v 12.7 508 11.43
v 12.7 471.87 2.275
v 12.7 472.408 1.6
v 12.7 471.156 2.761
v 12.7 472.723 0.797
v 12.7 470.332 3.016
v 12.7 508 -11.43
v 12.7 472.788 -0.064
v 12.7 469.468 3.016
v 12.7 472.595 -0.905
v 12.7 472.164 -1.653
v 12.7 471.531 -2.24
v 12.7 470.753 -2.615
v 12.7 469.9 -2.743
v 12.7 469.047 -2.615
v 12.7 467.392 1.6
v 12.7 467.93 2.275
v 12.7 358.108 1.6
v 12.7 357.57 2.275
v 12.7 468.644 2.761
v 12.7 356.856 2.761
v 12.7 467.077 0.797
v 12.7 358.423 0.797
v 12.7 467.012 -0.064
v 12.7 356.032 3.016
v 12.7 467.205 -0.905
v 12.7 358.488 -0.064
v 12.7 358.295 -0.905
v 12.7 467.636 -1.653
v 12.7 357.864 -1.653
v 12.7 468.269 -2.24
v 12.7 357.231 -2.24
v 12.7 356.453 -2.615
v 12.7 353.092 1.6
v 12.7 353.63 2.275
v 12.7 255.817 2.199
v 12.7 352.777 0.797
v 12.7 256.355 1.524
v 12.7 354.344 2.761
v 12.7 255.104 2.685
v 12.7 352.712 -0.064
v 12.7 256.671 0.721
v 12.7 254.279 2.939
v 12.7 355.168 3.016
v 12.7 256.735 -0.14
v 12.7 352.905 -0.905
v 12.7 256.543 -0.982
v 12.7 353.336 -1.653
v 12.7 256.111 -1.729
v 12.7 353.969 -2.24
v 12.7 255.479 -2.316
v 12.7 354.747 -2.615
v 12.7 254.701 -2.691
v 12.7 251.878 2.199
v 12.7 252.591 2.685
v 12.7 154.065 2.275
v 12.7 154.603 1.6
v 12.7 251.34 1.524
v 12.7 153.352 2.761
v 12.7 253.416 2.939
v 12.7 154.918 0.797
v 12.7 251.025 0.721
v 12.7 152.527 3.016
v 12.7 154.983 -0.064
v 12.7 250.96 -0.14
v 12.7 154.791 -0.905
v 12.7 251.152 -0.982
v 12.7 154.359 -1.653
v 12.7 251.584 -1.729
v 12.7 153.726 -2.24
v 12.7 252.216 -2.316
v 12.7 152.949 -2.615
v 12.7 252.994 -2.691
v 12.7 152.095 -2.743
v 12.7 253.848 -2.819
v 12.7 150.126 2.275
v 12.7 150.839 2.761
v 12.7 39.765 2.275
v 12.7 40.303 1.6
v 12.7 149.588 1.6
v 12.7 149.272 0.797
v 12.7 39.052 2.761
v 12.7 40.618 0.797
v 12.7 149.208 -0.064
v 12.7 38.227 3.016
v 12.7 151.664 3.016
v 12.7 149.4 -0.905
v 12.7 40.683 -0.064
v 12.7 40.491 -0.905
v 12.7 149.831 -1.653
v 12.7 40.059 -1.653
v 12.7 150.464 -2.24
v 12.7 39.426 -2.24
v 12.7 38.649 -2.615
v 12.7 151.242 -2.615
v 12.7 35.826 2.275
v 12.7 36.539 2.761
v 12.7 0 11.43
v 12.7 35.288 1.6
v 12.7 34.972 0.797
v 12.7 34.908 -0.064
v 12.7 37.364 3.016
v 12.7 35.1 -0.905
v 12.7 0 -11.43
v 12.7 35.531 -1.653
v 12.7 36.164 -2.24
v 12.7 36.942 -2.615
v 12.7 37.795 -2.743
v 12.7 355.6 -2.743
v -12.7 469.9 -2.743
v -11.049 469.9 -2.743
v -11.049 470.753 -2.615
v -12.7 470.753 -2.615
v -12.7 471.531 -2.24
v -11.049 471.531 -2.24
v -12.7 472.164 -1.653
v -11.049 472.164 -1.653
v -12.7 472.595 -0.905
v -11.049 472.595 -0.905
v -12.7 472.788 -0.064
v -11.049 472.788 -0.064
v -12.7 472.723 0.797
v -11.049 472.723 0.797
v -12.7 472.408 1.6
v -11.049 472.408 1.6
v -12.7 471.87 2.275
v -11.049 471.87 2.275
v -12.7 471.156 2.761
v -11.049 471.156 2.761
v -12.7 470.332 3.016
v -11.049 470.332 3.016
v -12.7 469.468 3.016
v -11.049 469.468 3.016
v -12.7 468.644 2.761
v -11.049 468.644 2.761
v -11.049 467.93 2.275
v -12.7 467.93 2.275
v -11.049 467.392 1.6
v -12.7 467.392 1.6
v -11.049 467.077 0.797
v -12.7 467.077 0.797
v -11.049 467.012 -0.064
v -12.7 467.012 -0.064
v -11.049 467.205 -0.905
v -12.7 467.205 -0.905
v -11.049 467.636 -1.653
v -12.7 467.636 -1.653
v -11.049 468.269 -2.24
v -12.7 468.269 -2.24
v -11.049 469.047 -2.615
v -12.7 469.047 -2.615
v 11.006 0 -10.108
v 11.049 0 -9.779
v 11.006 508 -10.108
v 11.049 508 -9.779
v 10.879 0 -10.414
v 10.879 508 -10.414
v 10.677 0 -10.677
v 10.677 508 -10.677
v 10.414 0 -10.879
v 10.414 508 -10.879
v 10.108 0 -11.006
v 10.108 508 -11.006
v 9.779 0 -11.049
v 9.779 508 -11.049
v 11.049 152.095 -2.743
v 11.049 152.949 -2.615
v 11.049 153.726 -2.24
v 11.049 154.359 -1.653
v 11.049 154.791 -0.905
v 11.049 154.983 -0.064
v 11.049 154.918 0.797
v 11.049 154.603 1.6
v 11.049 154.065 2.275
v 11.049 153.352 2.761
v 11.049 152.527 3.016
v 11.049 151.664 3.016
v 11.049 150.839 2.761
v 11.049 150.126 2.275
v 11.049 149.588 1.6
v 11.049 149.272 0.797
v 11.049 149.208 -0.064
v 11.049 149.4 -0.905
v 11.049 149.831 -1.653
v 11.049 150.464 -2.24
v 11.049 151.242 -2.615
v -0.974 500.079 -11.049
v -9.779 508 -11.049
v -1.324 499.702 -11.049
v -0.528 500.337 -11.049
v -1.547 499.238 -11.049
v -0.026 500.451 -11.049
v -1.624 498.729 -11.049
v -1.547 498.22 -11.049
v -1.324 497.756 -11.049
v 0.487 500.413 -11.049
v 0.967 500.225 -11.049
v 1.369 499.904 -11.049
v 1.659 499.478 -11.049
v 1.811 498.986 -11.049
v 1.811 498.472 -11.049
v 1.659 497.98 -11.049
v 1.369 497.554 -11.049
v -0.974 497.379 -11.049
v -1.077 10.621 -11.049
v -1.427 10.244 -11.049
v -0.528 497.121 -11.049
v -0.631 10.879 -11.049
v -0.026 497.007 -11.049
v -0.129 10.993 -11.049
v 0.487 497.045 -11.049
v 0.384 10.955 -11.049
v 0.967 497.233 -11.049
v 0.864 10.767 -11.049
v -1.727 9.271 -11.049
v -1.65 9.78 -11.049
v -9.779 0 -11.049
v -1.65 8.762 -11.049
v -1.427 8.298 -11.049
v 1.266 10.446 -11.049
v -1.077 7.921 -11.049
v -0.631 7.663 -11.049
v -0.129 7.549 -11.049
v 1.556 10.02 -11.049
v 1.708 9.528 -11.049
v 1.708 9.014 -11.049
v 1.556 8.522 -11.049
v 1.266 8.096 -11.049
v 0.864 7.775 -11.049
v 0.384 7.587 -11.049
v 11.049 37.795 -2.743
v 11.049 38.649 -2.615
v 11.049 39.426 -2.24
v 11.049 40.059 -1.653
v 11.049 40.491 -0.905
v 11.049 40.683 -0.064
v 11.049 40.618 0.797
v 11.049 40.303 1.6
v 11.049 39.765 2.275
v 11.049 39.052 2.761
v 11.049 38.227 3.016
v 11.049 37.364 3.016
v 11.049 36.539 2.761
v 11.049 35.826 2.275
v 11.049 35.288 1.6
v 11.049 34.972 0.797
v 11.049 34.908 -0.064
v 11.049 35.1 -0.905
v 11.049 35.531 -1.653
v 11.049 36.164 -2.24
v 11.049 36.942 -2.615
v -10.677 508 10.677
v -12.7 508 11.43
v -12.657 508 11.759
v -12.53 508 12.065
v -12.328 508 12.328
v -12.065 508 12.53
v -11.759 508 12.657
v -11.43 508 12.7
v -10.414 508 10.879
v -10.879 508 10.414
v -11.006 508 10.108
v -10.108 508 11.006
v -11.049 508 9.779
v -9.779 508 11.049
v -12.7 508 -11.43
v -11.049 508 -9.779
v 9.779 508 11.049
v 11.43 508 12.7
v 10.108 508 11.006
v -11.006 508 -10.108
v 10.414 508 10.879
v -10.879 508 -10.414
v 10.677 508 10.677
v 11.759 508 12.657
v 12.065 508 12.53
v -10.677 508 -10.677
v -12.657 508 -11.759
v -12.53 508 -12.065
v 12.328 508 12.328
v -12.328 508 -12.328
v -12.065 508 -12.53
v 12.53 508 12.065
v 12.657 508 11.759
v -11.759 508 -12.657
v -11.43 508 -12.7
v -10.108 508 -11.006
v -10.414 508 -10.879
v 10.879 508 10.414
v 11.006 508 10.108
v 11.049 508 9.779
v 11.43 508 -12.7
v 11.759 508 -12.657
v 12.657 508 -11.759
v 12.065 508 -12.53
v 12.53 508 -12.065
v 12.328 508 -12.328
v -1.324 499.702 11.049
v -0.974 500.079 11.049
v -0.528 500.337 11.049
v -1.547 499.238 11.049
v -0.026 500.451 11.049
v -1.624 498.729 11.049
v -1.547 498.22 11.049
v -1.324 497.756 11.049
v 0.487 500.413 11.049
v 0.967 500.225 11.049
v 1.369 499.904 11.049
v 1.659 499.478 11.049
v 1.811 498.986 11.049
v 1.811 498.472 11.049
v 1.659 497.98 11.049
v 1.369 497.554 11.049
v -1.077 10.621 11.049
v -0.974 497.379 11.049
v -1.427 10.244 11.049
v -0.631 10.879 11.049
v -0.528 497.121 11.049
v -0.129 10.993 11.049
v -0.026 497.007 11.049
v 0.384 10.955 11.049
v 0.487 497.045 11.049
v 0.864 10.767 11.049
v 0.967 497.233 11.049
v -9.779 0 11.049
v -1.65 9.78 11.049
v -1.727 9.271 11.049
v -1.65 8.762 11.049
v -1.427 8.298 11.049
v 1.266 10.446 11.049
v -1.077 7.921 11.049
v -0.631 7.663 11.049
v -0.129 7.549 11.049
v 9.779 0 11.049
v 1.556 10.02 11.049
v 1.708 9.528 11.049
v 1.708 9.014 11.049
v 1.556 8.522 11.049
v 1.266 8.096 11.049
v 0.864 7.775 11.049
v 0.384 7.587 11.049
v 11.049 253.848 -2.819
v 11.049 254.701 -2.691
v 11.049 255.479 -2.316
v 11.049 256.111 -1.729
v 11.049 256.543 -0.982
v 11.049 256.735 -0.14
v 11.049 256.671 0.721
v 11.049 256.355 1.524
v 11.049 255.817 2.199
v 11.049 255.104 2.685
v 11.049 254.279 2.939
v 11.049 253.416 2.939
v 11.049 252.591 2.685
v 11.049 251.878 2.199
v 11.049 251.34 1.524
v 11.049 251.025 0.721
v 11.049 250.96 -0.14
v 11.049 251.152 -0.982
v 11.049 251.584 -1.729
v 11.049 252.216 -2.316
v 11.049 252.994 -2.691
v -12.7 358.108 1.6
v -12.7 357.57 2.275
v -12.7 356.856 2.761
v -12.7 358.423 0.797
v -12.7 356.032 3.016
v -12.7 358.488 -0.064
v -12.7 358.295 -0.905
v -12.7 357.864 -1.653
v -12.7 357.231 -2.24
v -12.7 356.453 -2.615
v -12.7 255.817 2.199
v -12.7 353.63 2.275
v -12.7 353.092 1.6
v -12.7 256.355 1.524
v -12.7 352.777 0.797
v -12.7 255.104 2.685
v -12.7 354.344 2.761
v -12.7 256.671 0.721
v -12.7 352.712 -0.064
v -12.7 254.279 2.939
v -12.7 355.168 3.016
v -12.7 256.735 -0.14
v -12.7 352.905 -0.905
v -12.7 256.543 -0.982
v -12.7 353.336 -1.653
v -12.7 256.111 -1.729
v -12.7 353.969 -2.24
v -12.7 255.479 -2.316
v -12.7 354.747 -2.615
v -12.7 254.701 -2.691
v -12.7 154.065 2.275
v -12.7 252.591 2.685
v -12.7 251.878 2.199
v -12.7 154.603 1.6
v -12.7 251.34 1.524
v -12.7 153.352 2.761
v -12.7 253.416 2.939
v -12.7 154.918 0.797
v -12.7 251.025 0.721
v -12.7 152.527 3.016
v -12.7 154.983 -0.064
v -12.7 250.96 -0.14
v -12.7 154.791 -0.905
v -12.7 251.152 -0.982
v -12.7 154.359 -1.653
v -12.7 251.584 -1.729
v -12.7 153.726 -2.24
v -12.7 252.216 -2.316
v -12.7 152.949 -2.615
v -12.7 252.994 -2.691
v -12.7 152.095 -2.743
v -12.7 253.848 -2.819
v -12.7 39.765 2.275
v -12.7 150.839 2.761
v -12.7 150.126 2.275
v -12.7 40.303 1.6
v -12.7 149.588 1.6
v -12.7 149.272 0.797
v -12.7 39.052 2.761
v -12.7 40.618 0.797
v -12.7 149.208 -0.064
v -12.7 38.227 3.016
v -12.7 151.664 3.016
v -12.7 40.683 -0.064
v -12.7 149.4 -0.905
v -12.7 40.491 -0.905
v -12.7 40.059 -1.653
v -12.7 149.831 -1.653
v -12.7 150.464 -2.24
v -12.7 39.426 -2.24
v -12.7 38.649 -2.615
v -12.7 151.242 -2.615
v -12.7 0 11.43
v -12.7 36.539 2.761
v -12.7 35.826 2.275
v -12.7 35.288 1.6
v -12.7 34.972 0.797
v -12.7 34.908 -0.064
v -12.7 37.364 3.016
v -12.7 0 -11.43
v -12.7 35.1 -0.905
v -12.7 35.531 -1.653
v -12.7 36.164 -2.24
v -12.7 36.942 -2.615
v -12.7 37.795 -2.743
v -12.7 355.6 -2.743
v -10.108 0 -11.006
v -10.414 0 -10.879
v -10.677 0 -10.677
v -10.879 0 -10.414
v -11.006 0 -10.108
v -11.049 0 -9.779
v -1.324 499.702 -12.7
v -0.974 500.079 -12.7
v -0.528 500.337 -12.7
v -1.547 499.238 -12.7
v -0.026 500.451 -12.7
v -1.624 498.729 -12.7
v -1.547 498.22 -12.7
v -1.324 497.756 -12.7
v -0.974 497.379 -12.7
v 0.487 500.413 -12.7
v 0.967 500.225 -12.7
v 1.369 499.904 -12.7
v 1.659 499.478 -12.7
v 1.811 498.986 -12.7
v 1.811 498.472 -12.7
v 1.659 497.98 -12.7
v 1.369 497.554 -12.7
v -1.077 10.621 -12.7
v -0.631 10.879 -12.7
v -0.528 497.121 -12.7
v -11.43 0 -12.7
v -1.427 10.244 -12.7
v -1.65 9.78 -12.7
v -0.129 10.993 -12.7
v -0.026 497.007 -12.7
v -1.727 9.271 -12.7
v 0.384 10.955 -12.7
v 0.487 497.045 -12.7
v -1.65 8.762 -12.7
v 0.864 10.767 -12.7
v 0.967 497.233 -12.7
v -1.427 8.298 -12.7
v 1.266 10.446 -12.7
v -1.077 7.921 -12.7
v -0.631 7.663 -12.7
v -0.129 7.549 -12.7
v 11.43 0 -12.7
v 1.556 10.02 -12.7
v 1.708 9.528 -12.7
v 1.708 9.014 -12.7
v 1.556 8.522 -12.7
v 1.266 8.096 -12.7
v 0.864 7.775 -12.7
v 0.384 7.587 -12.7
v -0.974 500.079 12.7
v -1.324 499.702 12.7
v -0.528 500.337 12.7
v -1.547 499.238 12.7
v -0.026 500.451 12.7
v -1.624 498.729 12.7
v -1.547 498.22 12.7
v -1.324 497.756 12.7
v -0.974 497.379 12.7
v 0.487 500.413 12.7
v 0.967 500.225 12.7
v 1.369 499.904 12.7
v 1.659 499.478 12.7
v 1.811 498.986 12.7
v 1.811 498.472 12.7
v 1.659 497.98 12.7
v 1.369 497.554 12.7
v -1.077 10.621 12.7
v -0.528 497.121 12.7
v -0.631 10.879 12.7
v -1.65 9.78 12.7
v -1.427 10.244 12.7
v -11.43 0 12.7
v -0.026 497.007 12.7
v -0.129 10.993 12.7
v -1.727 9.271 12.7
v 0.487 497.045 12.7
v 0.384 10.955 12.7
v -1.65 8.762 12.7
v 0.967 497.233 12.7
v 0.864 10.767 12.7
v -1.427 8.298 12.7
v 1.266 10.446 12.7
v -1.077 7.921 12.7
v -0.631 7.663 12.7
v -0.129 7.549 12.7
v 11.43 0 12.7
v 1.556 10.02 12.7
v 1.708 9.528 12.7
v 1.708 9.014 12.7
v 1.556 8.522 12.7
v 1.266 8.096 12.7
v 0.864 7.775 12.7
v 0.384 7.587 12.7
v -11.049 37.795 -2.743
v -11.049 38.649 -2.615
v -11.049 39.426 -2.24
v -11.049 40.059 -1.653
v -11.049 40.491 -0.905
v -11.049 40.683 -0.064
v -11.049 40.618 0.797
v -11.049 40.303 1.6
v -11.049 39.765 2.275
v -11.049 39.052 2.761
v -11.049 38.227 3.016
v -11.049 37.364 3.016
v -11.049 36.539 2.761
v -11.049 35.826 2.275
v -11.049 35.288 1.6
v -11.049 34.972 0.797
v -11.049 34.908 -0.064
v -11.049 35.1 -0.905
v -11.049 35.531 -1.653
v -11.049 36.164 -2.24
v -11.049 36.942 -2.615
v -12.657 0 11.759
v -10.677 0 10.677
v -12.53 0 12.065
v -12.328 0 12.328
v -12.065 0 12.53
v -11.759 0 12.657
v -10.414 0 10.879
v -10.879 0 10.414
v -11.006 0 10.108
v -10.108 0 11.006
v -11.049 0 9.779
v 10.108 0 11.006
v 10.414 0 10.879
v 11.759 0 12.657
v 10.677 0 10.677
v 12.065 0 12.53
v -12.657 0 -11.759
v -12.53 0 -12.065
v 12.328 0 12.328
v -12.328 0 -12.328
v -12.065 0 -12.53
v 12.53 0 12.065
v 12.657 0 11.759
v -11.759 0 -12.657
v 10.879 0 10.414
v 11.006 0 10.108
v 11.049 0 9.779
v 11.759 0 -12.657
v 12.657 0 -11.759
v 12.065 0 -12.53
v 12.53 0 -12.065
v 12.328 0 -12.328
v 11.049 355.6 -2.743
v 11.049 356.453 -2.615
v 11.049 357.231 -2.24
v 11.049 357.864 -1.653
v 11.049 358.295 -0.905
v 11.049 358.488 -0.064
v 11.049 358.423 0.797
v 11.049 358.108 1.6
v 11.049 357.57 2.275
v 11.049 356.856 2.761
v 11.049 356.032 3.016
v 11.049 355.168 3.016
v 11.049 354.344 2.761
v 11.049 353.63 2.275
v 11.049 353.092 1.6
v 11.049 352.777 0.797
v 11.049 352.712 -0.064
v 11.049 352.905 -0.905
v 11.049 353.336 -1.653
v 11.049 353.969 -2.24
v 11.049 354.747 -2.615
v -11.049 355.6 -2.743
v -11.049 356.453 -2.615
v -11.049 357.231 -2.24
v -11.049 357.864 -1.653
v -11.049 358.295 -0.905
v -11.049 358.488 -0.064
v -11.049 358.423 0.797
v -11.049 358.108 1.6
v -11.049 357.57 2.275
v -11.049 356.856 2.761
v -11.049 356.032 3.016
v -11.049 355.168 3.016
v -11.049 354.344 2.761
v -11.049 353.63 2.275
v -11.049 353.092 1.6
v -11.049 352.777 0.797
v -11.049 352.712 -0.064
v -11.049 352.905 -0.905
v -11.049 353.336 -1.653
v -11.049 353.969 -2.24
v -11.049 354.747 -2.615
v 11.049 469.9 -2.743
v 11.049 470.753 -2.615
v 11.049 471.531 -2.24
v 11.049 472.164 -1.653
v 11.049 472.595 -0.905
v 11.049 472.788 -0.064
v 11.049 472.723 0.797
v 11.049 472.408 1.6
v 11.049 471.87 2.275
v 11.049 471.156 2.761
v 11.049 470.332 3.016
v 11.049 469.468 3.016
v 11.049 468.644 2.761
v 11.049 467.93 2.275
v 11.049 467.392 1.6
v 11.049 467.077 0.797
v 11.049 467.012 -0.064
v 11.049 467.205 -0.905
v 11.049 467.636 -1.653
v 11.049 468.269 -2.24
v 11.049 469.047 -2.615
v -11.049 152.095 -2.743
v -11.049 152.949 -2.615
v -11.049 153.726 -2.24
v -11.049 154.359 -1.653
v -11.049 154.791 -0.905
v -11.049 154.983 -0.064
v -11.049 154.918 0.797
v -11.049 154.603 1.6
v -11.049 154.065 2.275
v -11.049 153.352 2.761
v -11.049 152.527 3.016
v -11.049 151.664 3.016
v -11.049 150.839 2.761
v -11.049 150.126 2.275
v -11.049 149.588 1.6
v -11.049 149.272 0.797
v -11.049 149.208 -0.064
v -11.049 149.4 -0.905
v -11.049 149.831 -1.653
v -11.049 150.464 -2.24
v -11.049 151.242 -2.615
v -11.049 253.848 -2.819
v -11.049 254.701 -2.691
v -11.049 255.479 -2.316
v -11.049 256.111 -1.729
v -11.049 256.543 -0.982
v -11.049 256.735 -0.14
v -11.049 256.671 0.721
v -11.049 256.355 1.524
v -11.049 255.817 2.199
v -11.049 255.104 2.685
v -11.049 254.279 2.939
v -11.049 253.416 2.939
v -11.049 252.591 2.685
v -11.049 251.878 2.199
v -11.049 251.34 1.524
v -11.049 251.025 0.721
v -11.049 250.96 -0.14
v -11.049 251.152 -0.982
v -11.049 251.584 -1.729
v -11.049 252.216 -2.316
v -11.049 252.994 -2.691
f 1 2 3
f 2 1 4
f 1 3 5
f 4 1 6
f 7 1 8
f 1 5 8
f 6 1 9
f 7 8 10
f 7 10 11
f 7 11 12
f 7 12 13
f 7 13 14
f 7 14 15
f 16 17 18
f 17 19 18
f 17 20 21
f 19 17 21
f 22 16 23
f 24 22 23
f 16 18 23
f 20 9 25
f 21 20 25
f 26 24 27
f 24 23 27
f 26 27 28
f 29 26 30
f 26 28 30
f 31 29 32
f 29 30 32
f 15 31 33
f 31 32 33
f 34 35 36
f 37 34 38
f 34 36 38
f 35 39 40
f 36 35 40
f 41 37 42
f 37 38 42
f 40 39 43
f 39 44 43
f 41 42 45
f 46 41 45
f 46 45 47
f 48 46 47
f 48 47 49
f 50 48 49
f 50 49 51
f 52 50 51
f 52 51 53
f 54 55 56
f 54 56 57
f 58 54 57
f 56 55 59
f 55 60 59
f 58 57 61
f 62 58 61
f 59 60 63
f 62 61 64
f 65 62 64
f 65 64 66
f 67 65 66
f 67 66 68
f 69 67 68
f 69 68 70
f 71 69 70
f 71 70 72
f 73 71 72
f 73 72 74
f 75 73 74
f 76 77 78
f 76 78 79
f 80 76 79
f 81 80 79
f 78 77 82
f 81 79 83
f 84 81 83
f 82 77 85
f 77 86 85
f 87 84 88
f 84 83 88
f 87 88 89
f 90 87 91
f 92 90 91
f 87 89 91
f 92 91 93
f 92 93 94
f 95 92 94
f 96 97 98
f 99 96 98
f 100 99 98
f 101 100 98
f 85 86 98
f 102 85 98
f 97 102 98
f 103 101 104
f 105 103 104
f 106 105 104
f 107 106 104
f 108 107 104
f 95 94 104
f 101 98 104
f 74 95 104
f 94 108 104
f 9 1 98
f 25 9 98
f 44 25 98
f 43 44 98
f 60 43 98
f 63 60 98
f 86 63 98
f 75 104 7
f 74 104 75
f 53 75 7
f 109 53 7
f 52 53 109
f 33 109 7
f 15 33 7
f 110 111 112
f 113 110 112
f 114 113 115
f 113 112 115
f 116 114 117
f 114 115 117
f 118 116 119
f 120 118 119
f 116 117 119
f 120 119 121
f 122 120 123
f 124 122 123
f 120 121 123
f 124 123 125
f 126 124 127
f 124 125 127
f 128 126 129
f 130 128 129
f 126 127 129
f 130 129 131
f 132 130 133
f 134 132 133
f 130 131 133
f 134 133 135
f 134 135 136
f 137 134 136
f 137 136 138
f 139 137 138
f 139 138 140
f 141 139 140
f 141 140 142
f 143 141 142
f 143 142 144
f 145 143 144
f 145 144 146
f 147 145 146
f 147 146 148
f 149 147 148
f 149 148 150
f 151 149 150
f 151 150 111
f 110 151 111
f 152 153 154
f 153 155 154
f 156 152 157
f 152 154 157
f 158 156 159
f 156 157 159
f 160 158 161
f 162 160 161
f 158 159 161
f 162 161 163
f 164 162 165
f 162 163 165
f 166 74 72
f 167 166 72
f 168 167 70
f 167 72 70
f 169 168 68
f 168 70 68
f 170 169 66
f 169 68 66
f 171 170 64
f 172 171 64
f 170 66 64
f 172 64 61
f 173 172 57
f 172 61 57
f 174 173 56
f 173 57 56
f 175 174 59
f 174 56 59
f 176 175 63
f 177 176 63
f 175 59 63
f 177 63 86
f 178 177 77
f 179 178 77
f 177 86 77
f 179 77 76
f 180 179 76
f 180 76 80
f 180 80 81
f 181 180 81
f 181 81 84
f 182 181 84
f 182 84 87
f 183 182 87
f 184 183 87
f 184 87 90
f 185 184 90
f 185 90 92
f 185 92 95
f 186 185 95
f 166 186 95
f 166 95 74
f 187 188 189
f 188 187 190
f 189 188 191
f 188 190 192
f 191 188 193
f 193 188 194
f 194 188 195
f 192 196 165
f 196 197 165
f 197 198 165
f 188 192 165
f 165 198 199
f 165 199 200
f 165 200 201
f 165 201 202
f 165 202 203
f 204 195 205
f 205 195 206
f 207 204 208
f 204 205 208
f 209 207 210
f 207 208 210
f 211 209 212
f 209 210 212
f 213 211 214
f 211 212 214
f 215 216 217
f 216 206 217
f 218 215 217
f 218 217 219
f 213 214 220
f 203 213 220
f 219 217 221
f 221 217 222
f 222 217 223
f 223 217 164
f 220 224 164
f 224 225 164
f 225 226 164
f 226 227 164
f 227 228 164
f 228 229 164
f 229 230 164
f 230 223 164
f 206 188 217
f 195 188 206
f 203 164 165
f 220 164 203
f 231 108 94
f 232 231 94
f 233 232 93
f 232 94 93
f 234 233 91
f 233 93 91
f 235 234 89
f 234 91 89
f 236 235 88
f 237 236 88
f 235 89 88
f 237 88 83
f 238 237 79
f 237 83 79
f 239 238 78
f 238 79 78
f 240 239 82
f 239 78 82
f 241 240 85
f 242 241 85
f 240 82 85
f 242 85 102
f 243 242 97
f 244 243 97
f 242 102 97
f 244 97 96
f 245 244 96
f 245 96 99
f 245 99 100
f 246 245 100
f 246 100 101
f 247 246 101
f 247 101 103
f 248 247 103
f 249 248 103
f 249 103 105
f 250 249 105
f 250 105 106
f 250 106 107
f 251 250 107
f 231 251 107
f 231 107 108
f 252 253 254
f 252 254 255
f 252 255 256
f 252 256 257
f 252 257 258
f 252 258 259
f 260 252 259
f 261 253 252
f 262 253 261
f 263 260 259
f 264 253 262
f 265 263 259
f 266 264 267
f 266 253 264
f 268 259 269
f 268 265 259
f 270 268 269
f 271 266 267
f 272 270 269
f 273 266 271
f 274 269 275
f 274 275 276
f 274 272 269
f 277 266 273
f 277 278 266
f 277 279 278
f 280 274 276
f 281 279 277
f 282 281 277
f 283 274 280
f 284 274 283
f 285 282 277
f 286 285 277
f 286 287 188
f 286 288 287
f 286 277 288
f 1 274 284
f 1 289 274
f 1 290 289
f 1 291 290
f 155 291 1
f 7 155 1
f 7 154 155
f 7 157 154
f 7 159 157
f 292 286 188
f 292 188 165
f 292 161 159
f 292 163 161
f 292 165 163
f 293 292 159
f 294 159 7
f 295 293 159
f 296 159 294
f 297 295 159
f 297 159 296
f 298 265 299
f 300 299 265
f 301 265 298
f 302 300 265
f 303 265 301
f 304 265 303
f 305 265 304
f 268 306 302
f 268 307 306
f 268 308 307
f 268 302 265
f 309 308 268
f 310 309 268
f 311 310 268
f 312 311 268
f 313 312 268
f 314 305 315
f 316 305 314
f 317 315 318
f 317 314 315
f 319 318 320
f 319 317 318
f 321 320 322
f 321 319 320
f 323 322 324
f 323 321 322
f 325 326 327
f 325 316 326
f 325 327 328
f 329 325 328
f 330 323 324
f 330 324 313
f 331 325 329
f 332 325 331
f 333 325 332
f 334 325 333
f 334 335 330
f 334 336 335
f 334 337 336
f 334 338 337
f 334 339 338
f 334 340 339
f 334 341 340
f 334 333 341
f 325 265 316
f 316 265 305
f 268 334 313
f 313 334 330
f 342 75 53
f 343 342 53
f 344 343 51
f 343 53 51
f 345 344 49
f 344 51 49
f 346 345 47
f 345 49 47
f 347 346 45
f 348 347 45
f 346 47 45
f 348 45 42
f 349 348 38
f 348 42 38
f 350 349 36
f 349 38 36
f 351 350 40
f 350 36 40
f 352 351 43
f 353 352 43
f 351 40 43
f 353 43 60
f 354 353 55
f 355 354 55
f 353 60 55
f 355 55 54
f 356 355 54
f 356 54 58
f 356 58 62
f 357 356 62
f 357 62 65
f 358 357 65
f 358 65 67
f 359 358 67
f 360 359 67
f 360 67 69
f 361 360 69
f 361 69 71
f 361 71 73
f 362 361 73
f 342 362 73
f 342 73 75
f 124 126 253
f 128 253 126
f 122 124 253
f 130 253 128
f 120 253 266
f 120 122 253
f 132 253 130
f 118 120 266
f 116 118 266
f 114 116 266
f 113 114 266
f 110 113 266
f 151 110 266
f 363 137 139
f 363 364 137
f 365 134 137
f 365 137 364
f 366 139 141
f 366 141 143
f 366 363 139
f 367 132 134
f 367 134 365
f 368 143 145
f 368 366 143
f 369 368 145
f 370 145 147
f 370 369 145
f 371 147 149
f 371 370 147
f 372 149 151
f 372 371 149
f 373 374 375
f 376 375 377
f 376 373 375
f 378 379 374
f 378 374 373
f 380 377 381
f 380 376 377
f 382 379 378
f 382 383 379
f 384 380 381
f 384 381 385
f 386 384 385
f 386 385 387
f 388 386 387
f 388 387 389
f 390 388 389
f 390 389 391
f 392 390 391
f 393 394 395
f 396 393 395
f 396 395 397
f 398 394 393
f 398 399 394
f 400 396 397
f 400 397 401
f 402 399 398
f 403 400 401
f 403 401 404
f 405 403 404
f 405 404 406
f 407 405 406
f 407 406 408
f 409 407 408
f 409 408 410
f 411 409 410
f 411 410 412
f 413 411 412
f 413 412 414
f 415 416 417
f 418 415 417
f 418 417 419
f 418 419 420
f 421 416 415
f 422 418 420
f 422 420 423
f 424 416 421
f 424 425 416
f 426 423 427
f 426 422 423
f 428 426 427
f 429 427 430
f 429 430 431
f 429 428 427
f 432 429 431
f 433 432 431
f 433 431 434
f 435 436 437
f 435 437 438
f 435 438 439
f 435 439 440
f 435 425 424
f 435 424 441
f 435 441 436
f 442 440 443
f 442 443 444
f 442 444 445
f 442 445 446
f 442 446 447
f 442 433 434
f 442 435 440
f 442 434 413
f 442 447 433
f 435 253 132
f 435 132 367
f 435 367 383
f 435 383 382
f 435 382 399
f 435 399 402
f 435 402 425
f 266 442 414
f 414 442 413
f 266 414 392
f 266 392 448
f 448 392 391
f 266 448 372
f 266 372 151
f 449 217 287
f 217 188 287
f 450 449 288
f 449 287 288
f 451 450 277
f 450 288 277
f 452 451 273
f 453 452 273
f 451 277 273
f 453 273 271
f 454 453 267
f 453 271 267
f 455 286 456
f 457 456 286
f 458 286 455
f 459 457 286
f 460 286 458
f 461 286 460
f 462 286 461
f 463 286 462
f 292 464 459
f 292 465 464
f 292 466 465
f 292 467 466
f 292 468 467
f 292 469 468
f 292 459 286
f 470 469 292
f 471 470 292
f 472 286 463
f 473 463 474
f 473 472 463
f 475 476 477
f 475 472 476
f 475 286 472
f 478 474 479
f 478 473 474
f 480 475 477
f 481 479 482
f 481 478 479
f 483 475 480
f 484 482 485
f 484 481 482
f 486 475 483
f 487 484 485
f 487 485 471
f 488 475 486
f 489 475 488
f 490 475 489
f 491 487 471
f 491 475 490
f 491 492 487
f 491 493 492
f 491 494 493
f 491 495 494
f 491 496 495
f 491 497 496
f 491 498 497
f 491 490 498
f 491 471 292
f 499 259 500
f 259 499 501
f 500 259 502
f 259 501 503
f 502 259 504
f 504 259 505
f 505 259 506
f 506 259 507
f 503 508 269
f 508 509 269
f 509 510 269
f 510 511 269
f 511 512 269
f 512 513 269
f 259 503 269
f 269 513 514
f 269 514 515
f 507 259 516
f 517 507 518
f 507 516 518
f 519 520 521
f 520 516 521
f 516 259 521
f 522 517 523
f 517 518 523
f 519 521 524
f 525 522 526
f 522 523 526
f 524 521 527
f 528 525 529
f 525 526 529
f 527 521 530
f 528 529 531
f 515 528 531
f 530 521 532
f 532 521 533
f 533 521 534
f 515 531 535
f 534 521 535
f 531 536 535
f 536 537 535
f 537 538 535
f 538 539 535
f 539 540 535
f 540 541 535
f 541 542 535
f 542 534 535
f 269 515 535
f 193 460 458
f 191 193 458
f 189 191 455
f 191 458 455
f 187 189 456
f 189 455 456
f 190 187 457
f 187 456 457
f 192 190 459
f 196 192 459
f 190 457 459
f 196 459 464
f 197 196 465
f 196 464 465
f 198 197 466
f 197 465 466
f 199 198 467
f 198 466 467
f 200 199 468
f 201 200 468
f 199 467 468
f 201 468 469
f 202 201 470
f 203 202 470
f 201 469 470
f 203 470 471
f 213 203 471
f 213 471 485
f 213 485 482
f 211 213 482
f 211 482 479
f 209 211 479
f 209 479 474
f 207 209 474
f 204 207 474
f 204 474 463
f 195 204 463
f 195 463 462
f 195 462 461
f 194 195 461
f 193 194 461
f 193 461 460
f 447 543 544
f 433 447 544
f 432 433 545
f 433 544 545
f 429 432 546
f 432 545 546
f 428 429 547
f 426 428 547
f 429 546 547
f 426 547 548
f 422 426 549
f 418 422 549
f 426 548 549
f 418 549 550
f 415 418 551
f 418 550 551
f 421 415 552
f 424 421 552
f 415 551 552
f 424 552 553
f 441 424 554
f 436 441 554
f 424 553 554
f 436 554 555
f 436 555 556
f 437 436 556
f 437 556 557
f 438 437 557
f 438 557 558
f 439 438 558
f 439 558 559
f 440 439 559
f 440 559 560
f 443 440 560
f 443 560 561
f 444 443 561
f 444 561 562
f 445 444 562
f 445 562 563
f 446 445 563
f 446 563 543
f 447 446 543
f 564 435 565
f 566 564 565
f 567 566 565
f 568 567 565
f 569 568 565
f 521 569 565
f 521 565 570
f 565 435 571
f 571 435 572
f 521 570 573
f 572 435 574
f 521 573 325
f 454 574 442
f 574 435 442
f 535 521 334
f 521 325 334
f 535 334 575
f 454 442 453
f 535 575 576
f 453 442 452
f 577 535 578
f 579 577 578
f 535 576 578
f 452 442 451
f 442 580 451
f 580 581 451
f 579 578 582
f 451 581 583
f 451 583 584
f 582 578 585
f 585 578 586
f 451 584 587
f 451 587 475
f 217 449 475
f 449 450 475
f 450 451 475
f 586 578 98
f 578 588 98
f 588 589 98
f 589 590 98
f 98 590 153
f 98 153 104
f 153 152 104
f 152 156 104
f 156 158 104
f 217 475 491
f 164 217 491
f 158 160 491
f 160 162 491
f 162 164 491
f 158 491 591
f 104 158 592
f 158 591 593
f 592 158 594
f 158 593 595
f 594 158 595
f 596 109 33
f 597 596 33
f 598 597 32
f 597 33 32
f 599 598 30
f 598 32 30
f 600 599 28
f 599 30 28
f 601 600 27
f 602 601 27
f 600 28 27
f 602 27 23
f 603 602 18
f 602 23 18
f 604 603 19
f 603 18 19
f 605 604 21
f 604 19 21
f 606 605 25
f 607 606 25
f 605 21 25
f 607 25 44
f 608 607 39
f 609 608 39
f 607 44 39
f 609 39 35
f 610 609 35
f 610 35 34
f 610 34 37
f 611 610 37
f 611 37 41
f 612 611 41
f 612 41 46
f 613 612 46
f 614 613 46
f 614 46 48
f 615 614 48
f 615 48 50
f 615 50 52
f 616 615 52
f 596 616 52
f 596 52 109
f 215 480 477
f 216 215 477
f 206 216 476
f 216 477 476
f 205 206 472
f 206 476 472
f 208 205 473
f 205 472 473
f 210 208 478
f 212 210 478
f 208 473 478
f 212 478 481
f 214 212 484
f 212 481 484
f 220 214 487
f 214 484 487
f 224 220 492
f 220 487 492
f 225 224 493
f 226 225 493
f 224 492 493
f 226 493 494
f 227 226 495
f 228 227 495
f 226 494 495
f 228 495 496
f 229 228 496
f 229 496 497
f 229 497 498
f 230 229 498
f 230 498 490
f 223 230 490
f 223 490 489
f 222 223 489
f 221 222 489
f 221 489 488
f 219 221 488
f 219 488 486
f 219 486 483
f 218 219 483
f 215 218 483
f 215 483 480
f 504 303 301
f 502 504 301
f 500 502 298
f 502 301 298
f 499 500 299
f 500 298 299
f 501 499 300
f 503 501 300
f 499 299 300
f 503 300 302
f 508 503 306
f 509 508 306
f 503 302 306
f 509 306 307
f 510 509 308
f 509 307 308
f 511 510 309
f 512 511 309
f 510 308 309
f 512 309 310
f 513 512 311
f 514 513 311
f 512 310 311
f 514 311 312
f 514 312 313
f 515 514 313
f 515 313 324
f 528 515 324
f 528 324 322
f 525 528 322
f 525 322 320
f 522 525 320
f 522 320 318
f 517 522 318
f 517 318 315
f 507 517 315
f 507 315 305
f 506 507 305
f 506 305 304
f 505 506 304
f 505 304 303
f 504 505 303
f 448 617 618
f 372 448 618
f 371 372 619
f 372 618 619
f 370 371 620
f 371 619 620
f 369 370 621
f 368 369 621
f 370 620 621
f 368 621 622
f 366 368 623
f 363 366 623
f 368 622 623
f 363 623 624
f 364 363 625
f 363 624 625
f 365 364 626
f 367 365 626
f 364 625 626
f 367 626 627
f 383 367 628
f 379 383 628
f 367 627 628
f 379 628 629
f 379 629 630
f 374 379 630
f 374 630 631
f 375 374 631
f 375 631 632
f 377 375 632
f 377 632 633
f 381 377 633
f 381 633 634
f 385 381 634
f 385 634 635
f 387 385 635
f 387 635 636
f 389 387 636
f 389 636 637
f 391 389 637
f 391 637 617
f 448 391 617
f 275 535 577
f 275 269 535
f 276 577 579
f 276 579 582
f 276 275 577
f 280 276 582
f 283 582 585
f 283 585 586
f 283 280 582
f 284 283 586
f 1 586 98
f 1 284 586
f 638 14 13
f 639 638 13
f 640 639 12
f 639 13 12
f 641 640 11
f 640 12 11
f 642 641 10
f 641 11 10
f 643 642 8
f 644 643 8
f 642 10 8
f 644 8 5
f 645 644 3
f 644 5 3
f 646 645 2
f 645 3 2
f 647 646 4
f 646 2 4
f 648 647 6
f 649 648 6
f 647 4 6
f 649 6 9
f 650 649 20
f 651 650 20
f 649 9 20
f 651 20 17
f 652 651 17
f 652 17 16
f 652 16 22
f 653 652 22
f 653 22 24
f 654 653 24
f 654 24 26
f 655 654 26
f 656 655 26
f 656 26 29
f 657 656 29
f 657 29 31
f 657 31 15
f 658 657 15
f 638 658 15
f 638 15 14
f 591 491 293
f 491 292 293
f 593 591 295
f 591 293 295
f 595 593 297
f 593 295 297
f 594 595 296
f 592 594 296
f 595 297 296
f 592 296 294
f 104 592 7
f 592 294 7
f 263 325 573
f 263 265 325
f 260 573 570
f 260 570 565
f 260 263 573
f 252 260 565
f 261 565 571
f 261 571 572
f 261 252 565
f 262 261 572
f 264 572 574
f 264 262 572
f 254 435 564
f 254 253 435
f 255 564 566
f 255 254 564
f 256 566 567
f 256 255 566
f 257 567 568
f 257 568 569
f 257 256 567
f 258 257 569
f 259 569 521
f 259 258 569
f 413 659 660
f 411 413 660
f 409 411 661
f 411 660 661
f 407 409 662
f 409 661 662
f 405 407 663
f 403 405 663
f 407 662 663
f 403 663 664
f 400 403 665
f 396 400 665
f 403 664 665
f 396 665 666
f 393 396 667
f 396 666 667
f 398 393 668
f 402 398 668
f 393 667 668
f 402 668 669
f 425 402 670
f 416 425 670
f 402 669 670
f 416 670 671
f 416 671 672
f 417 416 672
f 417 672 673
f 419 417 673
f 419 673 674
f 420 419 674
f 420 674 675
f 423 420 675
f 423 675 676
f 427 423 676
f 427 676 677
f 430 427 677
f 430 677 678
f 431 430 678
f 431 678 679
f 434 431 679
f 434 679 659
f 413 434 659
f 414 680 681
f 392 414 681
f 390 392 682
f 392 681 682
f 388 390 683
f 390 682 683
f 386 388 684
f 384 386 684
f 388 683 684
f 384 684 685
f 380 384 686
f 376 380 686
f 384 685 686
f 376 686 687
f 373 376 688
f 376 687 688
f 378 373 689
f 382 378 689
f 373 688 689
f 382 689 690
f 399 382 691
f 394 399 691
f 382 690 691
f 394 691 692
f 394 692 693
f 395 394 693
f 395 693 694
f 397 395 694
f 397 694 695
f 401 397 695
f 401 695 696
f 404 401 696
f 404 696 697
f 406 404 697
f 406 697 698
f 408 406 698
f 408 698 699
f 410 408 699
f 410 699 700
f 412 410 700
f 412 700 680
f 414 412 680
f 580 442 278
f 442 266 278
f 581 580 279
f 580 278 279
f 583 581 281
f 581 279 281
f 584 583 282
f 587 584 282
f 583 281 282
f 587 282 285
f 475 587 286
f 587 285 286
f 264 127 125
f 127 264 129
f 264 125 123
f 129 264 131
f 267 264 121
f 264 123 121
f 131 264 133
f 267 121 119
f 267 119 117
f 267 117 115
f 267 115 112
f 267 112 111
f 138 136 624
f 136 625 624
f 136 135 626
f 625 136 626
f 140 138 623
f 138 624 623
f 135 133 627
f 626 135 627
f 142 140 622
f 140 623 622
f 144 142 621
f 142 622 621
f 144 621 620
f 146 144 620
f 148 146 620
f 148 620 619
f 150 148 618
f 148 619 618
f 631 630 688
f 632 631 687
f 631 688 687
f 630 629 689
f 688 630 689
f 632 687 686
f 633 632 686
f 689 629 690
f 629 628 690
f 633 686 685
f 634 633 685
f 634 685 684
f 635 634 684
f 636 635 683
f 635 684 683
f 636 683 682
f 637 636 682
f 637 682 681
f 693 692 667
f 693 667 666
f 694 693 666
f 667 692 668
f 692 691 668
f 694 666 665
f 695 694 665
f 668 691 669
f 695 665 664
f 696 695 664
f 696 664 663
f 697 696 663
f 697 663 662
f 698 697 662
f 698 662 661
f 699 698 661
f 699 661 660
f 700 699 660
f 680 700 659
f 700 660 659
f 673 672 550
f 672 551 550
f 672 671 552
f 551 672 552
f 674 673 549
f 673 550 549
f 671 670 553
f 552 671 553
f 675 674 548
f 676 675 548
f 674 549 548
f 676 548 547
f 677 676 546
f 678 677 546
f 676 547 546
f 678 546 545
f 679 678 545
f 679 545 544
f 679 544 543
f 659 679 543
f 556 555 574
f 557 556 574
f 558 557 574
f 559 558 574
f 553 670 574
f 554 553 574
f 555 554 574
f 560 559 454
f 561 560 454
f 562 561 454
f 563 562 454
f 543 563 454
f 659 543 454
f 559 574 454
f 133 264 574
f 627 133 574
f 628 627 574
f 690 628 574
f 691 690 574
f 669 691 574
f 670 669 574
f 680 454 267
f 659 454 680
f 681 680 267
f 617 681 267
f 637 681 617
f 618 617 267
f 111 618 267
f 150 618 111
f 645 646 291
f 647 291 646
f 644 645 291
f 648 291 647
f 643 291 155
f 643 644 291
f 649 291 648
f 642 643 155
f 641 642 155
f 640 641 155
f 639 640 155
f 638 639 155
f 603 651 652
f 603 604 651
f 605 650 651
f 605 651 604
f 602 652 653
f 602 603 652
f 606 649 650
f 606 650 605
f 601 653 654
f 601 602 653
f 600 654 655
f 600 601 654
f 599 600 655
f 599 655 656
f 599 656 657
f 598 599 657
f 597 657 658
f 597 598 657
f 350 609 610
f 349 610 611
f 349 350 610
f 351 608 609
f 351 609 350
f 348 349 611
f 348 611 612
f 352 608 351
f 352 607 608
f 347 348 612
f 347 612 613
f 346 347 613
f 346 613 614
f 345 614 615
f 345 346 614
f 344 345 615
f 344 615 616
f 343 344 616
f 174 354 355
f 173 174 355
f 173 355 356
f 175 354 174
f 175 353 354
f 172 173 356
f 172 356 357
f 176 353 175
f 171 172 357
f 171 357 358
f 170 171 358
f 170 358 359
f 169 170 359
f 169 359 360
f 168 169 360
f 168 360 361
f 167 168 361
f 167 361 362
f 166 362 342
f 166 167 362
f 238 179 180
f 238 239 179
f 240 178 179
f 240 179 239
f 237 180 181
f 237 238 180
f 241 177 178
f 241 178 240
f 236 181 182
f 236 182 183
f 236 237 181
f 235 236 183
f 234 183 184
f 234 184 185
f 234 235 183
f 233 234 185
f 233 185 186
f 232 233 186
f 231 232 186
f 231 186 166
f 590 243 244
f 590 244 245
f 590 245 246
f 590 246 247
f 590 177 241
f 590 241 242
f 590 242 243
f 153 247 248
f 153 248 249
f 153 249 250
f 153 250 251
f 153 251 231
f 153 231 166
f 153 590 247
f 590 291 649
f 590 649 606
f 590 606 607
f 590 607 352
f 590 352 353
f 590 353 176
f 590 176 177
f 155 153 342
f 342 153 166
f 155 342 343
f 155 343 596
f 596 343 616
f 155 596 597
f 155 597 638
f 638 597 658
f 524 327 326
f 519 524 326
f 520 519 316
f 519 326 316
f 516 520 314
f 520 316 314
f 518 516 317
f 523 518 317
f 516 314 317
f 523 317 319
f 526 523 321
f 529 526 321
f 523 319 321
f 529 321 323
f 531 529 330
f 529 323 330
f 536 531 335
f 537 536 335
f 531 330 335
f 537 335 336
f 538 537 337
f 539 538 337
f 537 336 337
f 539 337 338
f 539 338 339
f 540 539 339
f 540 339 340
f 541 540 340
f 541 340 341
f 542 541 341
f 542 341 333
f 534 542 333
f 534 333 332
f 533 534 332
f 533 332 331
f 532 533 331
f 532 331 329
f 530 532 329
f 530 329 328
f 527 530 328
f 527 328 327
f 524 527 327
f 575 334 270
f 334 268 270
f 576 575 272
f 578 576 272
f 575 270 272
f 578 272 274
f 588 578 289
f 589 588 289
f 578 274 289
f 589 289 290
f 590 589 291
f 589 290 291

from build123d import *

# Parameters (mm, degrees)
SKETCH1_W                  = 25.4
SKETCH1_H                  = 25.4
SKETCH1_W_2                = 22.098
SKETCH1_H_2                = 22.098
BOSS_EXTRUDE1_DEPTH        = 508
FILLET1_R                  = 1.27
F_1_0_228_DIAMETER_HOLE2_D = 5.7912
F_8_32_TAPPED_HOLE1_D      = 3.4544


with BuildPart() as part:
    # Sketch1 → Boss-Extrude1 (new body)
    with BuildSketch(Plane(origin=(0, 0, 0), x_dir=(1, 0, 0), z_dir=(0, 1, 0))):
        Rectangle(SKETCH1_W, SKETCH1_H)
        Rectangle(SKETCH1_W_2, SKETCH1_H_2, mode=Mode.SUBTRACT)
    extrude(amount=BOSS_EXTRUDE1_DEPTH)

    # Fillet1
    fillet1_edges = [part.edges().sort_by_distance(p)[0] for p in [
        (-11.049, 254, 11.049),
        (11.049, 254, 11.049),
        (11.049, 254, -11.049),
        (-11.049, 254, -11.049),
        (12.7, 254, 12.7),
        (-12.7, 254, 12.7),
        (-12.7, 254, -12.7),
        (12.7, 254, -12.7),
    ]]
    fillet(fillet1_edges, radius=FILLET1_R)

    # #1 (0.228) Diameter Hole2 (through all)
    with Locations(Plane.ZY.offset(12.7)):
        with Locations((0.1524, 469.9), (0.1524, 355.6), (0.0762, 253.8476), (0.1524, 152.0952), (0.1524, 37.7952)):
            Hole(F_1_0_228_DIAMETER_HOLE2_D / 2)

    # #8-32 Tapped Hole1 (through all)
    with Locations(Plane.XY.offset(12.7)):
        with Locations((0, 9.271), (0.103095802, 498.729)):
            Hole(F_8_32_TAPPED_HOLE1_D / 2)


solid = part.part
